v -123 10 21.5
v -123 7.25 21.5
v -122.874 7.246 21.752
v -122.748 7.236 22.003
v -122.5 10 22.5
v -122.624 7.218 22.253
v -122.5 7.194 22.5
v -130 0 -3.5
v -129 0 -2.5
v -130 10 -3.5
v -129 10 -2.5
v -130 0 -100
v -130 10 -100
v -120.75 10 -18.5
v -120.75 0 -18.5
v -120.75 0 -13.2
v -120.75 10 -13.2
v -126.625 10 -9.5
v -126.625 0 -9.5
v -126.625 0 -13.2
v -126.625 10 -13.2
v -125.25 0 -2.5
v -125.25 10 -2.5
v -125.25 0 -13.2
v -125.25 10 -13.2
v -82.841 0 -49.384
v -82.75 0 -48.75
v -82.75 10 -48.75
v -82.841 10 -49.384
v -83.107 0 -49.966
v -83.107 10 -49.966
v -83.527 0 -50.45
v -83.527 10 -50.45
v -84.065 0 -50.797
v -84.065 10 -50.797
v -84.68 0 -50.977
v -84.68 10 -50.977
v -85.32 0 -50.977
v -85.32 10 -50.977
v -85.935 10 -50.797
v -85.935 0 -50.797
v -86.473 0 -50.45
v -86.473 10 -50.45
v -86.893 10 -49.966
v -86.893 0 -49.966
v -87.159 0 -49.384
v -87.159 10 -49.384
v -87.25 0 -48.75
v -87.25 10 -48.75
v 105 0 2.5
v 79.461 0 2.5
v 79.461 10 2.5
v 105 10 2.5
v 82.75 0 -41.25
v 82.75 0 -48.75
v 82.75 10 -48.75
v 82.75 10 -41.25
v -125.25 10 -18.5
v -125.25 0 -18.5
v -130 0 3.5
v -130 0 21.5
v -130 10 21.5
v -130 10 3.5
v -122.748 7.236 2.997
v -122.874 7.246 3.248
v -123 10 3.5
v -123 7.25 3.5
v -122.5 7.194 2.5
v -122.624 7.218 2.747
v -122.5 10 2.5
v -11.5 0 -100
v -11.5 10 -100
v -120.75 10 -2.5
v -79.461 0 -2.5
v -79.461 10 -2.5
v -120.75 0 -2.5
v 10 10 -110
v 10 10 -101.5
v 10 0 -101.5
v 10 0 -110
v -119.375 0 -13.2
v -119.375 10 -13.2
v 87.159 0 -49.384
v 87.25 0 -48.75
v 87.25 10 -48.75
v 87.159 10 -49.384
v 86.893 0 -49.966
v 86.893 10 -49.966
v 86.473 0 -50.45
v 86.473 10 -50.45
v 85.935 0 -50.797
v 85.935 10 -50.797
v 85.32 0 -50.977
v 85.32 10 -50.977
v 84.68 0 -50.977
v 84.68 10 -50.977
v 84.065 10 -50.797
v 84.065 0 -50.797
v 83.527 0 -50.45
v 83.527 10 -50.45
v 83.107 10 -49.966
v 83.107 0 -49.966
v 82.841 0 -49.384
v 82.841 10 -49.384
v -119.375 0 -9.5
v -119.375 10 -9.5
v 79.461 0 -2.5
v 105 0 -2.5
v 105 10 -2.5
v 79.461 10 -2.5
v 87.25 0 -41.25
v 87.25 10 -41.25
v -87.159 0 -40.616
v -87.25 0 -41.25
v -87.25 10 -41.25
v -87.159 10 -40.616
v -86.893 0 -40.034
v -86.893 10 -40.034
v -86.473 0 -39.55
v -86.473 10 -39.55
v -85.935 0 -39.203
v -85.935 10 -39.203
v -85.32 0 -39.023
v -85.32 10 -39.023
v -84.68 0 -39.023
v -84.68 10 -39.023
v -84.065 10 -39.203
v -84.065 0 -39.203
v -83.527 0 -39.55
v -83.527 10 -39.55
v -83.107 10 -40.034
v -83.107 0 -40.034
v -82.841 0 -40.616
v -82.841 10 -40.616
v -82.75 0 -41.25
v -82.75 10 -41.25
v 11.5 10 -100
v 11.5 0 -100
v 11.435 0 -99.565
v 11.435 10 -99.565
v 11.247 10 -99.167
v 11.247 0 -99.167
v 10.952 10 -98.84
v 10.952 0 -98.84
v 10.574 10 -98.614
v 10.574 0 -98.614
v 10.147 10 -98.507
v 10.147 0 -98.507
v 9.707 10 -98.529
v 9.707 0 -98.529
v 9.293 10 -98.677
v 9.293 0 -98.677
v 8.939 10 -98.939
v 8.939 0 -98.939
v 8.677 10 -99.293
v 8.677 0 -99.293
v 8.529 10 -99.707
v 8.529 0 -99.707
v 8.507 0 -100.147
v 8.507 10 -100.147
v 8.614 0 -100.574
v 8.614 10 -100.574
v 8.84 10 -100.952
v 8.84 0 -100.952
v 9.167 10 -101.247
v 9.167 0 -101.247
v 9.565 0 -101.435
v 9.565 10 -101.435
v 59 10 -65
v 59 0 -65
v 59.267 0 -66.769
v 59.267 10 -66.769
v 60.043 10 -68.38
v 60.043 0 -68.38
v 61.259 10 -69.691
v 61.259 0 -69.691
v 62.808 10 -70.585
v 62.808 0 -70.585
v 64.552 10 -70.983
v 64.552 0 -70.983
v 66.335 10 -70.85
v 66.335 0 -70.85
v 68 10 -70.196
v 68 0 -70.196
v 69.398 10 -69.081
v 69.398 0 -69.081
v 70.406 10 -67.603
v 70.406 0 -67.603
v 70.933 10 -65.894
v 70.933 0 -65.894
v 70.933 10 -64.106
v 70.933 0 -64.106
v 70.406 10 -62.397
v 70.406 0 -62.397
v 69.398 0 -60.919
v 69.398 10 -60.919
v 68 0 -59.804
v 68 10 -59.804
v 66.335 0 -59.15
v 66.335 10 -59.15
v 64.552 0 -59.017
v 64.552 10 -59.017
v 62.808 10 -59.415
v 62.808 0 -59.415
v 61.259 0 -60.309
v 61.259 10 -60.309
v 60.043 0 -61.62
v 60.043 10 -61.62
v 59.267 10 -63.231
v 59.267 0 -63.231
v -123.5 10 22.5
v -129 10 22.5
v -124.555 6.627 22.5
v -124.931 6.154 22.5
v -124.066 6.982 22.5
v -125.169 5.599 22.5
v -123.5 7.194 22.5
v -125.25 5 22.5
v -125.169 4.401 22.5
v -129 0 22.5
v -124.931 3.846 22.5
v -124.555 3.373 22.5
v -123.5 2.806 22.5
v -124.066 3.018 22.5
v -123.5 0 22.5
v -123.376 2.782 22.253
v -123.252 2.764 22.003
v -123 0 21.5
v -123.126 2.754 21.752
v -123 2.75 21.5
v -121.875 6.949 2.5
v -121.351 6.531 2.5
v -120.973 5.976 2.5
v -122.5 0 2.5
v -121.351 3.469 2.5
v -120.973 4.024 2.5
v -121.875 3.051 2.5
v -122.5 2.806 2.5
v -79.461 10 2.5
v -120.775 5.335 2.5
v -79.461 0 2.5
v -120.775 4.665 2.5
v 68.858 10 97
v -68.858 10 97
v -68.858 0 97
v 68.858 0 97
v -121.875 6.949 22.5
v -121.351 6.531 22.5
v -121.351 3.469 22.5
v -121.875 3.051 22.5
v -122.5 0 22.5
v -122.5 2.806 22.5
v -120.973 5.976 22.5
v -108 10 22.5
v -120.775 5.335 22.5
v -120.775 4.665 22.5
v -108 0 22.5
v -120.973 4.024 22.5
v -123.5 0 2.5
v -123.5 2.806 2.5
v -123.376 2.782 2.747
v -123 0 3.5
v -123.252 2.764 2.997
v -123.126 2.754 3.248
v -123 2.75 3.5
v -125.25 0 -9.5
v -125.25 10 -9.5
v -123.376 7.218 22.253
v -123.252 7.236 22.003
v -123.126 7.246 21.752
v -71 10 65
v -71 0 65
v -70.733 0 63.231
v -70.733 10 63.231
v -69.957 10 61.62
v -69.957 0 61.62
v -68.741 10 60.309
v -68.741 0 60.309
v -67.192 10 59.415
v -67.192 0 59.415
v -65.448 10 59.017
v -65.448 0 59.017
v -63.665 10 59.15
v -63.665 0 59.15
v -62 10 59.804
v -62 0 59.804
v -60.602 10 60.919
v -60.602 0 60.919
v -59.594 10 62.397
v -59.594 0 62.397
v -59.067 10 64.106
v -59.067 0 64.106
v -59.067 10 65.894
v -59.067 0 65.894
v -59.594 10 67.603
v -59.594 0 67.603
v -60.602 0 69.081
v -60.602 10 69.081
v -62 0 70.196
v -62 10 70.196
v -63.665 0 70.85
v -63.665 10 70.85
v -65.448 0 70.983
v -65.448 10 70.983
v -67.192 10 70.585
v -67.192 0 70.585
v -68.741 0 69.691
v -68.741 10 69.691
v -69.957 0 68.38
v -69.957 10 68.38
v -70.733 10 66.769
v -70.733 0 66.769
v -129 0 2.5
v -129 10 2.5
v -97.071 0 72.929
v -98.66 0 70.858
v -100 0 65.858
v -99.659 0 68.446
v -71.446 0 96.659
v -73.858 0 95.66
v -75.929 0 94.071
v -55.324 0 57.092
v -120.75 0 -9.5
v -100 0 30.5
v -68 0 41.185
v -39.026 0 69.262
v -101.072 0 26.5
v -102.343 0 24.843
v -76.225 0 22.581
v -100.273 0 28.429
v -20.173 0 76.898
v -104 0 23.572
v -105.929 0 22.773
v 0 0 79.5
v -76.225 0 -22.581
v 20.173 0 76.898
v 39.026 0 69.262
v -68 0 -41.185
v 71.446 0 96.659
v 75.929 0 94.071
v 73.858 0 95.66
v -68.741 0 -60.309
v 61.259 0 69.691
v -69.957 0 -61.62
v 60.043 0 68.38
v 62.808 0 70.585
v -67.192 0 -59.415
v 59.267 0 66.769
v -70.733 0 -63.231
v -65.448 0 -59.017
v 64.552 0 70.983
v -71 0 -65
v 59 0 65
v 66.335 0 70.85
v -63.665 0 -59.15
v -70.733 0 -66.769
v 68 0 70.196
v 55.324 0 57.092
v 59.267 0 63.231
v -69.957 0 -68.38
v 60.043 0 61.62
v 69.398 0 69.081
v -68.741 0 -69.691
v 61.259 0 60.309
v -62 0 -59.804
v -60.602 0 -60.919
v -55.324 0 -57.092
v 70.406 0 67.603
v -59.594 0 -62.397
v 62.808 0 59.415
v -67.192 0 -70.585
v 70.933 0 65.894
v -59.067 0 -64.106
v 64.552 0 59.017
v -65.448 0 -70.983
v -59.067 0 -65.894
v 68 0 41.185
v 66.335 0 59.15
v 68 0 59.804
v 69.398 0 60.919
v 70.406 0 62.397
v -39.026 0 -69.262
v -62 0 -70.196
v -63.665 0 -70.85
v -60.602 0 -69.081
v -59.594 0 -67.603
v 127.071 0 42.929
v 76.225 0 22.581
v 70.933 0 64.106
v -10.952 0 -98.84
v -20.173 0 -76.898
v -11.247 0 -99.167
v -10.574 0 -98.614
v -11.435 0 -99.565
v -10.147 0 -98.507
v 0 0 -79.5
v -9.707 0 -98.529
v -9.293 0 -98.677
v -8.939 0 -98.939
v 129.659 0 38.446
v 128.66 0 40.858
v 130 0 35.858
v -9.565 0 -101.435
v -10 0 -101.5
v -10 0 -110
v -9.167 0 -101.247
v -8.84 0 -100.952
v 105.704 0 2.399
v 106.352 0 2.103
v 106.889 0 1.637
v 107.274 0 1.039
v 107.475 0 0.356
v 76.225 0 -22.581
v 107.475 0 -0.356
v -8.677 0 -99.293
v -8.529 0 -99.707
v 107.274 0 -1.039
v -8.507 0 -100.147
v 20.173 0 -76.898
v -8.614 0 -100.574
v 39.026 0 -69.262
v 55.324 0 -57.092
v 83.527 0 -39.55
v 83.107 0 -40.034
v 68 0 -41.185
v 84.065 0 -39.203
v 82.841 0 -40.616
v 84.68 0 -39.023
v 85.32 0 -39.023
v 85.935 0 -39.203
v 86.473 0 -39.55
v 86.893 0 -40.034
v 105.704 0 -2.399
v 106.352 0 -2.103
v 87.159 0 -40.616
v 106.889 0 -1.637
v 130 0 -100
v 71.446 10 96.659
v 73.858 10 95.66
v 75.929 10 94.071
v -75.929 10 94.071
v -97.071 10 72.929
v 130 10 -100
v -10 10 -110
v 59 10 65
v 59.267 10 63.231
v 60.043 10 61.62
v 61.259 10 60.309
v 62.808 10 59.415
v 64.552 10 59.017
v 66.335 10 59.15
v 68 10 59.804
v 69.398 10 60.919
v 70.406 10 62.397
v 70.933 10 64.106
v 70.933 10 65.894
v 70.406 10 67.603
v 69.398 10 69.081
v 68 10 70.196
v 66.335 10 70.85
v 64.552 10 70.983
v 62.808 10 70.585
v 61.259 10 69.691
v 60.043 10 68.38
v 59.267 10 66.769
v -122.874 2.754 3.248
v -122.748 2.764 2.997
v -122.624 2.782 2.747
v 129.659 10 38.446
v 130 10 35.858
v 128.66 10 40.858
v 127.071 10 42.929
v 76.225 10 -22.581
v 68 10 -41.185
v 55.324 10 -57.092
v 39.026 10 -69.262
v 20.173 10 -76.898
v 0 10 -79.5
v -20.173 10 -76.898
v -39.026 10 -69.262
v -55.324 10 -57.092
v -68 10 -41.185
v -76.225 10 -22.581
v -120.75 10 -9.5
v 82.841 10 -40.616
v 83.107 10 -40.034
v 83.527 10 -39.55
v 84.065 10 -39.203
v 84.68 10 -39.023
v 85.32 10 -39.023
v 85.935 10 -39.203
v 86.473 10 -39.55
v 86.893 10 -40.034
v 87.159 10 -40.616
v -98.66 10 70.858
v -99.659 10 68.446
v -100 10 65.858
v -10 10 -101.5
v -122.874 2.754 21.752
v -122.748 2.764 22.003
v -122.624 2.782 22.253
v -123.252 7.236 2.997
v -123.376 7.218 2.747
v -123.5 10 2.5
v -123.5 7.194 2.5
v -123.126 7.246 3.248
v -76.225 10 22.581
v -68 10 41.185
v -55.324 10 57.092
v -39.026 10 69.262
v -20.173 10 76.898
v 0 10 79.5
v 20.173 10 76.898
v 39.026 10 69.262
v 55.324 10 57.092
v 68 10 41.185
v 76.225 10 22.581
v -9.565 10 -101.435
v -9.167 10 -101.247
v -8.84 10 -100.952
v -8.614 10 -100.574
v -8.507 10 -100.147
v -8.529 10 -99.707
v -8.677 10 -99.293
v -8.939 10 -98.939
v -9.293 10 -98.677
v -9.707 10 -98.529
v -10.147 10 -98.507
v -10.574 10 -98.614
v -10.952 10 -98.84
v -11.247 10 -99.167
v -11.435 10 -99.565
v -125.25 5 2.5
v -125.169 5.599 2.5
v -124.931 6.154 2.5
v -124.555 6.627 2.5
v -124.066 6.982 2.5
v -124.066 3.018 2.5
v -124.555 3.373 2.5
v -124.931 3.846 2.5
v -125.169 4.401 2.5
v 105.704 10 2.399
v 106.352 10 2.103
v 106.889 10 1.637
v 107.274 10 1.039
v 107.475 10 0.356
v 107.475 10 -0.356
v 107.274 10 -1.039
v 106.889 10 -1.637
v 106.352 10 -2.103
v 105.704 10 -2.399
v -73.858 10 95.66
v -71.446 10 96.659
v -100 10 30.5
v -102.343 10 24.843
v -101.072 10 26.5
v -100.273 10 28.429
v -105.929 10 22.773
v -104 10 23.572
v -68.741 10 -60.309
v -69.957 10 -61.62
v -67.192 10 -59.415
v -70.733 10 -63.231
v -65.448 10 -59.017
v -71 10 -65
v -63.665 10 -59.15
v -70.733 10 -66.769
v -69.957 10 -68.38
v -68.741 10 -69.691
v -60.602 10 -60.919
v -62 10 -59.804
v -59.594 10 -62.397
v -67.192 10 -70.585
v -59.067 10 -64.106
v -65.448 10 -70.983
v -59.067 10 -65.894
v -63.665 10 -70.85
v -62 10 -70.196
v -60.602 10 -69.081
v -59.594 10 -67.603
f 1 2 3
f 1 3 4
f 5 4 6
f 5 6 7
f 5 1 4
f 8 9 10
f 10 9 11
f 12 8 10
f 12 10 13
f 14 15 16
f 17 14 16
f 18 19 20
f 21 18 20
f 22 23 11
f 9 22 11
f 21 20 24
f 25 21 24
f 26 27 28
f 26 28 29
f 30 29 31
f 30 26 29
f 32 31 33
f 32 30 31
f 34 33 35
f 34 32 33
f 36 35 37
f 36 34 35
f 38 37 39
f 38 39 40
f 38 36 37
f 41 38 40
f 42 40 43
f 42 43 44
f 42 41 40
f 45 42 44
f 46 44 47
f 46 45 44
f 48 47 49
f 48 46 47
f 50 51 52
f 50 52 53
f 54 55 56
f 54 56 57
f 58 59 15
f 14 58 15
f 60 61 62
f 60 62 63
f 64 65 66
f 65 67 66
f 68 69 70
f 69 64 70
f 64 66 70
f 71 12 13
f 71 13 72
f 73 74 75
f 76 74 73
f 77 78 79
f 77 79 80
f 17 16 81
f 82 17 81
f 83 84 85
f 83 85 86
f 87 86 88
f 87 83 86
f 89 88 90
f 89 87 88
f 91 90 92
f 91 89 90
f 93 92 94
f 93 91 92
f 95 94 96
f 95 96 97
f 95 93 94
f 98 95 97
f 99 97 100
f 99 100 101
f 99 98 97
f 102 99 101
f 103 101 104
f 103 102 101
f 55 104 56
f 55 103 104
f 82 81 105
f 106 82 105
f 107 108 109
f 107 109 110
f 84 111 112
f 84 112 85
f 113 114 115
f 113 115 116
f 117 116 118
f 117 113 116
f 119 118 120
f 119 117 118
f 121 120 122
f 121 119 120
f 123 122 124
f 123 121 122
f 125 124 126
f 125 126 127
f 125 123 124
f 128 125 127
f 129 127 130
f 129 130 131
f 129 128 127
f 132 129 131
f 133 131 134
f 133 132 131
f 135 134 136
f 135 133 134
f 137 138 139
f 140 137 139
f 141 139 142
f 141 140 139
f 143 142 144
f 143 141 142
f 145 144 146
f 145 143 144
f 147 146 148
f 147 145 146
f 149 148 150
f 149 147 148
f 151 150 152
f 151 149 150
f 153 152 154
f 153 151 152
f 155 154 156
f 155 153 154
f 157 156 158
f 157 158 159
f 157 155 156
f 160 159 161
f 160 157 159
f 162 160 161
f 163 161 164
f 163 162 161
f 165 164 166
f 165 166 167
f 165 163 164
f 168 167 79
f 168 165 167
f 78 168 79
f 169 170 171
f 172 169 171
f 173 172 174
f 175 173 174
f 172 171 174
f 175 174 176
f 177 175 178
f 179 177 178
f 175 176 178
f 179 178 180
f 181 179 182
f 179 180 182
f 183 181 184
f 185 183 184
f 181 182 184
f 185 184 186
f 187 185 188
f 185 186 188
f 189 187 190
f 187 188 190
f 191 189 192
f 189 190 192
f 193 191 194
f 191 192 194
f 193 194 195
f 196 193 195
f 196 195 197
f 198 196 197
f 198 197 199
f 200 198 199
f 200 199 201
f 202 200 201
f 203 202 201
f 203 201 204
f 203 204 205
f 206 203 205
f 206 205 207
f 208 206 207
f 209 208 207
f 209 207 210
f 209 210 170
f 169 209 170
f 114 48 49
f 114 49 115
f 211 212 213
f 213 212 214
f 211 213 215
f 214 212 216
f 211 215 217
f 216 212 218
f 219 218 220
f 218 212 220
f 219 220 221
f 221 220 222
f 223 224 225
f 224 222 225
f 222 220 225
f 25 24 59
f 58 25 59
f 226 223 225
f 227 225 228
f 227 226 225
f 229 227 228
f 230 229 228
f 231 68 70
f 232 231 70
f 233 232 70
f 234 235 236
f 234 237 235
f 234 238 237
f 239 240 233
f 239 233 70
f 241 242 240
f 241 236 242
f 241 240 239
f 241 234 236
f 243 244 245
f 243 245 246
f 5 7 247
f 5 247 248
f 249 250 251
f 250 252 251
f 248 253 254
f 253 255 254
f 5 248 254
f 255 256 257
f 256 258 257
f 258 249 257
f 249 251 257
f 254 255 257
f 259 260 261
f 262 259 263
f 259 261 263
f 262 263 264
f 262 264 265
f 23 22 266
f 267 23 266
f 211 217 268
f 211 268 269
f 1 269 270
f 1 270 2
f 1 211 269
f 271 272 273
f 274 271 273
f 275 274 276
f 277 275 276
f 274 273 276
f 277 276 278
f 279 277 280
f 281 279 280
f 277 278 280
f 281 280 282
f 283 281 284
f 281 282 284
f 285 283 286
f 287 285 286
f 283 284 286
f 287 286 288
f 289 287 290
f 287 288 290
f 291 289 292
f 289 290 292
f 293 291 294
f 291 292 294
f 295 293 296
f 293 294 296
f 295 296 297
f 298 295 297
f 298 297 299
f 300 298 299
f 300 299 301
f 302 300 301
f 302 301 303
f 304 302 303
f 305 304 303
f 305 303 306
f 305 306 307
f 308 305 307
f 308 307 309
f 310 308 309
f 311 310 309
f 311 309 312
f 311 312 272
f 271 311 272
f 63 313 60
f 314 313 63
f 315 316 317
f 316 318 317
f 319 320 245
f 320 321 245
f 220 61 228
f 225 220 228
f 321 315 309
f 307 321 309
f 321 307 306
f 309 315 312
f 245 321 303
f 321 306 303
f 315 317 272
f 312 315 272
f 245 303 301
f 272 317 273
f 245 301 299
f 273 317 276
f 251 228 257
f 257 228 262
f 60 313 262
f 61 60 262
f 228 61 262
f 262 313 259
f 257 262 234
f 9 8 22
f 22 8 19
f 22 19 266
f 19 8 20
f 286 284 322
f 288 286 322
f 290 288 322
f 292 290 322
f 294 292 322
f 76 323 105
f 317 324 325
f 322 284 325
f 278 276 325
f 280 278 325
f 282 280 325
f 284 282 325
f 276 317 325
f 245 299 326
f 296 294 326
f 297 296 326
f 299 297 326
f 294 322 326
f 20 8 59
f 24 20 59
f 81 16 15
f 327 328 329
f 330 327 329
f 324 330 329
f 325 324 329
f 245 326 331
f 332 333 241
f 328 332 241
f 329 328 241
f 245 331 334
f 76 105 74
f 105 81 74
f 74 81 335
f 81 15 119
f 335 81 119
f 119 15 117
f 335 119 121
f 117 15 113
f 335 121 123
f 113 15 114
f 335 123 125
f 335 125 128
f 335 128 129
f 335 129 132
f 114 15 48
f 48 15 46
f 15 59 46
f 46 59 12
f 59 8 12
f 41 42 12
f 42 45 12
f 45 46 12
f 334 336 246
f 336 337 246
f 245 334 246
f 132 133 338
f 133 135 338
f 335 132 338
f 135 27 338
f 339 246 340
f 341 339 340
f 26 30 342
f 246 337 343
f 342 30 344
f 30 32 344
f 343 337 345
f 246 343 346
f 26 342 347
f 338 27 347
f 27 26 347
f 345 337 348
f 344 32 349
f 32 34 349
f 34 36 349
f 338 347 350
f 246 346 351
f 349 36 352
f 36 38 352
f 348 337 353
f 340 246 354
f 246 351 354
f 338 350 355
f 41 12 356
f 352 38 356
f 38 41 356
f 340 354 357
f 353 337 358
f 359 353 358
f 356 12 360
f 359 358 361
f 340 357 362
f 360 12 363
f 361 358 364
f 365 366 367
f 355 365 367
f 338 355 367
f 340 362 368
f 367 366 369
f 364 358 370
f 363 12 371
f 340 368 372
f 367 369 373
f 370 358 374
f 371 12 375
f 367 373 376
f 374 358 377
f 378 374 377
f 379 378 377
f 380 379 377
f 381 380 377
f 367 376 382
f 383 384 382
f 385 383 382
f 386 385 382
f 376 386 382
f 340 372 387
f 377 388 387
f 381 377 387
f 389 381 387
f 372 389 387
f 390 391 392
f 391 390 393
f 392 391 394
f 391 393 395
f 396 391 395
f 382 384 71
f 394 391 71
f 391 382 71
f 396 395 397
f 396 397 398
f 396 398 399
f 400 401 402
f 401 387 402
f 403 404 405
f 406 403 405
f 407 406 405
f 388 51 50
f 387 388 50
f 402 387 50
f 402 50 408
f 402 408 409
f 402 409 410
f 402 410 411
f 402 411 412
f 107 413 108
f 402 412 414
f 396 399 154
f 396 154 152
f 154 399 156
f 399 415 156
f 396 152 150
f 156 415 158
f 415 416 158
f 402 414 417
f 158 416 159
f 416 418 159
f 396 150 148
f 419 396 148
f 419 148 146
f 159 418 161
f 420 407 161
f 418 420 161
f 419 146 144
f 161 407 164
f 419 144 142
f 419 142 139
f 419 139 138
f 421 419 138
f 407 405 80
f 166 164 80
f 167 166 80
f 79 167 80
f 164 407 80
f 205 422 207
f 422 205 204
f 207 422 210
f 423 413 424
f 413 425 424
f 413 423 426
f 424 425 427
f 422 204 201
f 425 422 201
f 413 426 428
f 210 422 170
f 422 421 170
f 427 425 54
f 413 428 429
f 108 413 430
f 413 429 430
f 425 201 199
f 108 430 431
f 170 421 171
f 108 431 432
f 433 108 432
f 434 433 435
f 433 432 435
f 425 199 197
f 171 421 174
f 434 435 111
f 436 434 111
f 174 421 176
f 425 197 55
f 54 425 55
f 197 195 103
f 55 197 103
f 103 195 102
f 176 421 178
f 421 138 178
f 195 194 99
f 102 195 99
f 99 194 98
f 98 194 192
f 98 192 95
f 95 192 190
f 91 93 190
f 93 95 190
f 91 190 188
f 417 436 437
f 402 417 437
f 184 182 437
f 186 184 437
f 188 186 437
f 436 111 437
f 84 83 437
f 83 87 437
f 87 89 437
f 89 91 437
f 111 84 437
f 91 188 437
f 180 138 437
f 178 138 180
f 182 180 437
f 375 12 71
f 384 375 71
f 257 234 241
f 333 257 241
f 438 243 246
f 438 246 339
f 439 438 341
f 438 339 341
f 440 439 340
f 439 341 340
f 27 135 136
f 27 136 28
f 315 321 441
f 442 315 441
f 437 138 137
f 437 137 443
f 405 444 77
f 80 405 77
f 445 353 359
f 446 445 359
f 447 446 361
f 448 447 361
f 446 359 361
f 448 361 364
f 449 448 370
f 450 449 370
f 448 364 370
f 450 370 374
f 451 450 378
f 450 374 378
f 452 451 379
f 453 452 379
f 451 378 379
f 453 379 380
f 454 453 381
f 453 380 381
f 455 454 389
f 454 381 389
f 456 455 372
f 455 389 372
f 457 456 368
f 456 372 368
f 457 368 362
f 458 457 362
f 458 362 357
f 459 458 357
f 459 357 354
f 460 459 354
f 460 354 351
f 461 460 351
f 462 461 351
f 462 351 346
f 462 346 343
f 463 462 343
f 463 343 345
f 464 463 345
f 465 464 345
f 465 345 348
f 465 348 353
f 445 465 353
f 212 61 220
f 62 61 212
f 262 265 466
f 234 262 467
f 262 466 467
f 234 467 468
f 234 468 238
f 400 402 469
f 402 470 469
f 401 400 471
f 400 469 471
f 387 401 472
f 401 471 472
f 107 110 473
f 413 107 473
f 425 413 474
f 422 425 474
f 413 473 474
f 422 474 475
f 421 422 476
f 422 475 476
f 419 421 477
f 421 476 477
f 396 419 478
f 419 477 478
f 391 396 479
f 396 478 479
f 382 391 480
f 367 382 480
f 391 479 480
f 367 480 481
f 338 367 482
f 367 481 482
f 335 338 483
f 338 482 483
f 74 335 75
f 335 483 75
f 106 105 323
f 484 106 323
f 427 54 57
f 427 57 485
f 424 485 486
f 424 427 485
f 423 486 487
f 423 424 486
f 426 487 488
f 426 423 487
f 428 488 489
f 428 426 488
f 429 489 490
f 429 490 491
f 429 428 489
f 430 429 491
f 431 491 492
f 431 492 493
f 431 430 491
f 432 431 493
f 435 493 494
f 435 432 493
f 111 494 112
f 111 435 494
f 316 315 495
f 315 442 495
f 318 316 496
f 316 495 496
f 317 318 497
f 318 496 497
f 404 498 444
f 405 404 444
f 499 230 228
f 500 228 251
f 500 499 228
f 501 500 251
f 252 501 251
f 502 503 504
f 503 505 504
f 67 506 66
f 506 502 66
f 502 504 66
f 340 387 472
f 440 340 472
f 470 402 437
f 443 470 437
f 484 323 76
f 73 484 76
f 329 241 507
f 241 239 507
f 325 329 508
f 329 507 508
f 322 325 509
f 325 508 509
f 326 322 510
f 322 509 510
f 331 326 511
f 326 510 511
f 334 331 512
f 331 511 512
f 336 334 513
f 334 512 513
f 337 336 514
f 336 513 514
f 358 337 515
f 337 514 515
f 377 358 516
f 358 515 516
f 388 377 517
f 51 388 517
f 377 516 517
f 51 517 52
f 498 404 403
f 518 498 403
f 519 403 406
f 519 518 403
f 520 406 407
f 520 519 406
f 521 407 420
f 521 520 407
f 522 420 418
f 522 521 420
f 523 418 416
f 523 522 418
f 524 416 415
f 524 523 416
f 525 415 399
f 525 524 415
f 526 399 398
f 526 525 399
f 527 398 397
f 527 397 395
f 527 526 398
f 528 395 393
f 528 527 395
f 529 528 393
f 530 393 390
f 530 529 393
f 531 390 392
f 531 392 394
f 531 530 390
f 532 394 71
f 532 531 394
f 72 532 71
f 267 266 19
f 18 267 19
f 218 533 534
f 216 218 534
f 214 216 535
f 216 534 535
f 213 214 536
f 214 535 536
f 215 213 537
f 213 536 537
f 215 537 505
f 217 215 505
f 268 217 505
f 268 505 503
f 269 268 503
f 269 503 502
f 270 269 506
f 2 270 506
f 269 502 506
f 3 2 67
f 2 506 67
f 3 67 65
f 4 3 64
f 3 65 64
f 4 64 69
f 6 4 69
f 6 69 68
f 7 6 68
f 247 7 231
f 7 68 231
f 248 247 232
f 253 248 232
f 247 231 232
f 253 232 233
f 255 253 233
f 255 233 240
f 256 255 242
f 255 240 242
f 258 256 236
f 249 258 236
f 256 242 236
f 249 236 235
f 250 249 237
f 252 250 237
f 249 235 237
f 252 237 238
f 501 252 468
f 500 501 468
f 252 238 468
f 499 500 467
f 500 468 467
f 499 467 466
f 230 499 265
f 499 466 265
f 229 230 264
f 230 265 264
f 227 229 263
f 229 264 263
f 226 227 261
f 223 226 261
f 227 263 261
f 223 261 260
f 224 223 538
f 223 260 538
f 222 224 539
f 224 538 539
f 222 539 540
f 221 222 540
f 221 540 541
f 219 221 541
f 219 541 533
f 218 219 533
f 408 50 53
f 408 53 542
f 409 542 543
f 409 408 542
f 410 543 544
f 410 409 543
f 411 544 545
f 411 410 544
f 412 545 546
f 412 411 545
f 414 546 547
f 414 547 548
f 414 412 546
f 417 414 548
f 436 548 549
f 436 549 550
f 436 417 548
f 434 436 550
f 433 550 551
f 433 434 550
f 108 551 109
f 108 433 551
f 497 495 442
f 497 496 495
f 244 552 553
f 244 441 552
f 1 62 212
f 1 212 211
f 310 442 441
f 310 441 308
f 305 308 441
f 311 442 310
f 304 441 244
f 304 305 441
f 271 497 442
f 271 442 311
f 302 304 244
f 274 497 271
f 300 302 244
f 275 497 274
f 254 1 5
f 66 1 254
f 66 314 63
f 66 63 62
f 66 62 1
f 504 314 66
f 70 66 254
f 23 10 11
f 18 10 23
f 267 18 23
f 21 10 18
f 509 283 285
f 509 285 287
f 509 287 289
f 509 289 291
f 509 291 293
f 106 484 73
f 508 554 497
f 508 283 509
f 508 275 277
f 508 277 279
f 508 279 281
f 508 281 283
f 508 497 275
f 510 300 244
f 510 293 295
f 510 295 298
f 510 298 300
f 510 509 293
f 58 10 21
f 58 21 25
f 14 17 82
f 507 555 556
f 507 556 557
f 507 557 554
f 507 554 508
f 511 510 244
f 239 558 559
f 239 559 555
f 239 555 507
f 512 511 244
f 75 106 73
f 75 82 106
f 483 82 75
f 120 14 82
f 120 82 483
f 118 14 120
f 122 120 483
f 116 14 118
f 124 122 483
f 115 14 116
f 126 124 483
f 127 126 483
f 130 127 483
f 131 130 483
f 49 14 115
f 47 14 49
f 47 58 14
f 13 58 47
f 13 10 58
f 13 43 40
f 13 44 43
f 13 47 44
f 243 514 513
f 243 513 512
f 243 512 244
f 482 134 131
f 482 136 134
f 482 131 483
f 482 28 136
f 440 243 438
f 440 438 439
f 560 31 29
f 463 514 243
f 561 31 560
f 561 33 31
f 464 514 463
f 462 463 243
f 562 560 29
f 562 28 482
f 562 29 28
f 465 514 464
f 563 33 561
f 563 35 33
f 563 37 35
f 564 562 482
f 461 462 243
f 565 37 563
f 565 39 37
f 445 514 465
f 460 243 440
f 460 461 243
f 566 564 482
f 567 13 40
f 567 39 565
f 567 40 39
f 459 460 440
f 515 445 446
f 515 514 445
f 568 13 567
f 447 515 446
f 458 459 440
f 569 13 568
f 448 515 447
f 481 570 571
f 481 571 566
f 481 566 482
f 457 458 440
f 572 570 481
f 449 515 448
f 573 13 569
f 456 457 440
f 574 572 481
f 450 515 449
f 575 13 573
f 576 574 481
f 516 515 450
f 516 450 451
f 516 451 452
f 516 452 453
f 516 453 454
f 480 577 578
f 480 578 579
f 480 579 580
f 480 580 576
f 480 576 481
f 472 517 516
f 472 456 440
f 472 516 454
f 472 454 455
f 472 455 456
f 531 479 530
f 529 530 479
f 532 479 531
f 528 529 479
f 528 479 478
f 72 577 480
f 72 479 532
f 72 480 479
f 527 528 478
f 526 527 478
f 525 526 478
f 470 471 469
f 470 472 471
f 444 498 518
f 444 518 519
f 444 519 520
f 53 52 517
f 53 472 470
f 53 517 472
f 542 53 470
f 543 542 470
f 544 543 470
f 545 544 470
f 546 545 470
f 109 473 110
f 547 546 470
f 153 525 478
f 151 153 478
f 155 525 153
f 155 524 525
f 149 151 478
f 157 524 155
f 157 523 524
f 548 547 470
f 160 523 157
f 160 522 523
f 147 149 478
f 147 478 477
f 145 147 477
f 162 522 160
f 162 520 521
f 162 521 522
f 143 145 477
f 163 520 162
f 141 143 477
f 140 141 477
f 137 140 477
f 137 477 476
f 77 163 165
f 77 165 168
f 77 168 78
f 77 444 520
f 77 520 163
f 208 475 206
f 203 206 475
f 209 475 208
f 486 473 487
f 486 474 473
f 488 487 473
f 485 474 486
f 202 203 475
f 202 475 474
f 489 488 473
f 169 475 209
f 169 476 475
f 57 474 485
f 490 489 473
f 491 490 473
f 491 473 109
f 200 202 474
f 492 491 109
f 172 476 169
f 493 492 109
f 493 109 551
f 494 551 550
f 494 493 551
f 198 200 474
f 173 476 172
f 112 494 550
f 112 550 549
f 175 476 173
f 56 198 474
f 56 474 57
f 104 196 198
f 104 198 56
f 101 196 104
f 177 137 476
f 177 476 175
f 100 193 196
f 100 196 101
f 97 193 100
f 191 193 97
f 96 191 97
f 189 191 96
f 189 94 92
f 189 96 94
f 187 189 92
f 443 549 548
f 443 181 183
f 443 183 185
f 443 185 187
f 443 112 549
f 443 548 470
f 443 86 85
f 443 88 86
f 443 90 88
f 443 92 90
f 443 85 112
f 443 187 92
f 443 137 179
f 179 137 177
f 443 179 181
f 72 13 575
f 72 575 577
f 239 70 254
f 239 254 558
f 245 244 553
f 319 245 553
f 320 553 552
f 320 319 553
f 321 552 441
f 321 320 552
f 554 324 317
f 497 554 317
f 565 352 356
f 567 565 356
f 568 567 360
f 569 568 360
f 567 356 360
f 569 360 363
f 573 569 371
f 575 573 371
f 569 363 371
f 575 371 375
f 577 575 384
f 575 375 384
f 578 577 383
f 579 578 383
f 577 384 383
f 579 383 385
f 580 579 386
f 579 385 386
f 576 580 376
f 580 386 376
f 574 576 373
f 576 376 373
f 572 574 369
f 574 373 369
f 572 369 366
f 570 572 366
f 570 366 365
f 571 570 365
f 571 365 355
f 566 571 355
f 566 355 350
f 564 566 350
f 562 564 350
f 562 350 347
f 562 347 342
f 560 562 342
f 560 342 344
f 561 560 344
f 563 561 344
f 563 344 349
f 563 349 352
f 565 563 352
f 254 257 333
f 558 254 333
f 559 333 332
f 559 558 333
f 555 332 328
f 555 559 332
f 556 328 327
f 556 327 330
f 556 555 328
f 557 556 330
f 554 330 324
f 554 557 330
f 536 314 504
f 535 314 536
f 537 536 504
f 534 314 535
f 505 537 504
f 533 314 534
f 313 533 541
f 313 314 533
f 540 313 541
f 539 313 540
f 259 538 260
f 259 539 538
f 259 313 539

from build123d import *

# Parameters (mm, degrees)
SKETCH1_W                  = 260
SKETCH1_H                  = 200
EXTRUDE1_DEPTH             = 10
SKETCH2_R                  = 79.5
EXTRUDE2_DEPTH             = 10
M4_CLEARANCE_HOLE2_DEPTH   = 10
EXTRUDE3_DEPTH             = 10
SKETCH6_W                  = 30
SKETCH6_H                  = 77.5
EXTRUDE4_DEPTH             = 10
FILLET1_R                  = 8
M4_CLEARANCE_HOLE3_D       = 4.5
M4_CLEARANCE_HOLE3_DEPTH   = 20
EXTRUDE5_DEPTH             = 10
F_12_0_12_DIAMETER_HOLE1_D = 12
CHAMFER1_SIZE              = 30
CHAMFER2_SIZE              = 1
CHAMFER3_SIZE              = 60
SKETCH16_W                 = 146
SKETCH16_H                 = 3
EXTRUDE6_DEPTH             = 10
FILLET4_R                  = 10
EXTRUDE7_DEPTH             = 10
SKETCH18_W                 = 20
SKETCH18_H                 = 10
EXTRUDE8_DEPTH             = 10
EXTRUDE9_DEPTH             = 10


# Read off the part's stored shape, not the designer's step: M4 Clearance Hole2
with BuildPart() as part:
    # Sketch1 → Extrude1 (new body)
    with BuildSketch(Plane(origin=(0, 0, 0), x_dir=(1, 0, 0), z_dir=(0, 1, 0))):
        Rectangle(SKETCH1_W, SKETCH1_H)
    extrude(amount=EXTRUDE1_DEPTH)

    # Sketch2 → Extrude2 (cut)
    with BuildSketch(Plane(origin=(0, 10, 0), x_dir=(1, 0, 0), z_dir=(0, 1, 0))):
        with Locations(Location((0, 0, 0), (0, 0, 270))):
            Circle(SKETCH2_R)
    extrude(amount=-EXTRUDE2_DEPTH, mode=Mode.SUBTRACT)

    # M4 Clearance Hole2 outline → M4 Clearance Hole2 (cut)
    with BuildSketch(Plane(origin=(0, 0, 0), x_dir=(1, 0, 0), z_dir=(0, 1, 0))):
        with BuildLine():
            ThreePointArc((-82.75, 48.75), (-85, 51), (-87.25, 48.75))
            Line((-87.25, 48.75), (-87.25, 41.25))
            ThreePointArc((-87.25, 41.25), (-85, 39), (-82.75, 41.25))
            Line((-82.75, 41.25), (-82.75, 48.75))
        make_face()
        with BuildLine():
            ThreePointArc((87.25, 48.75), (85, 51), (82.75, 48.75))
            Line((82.75, 48.75), (82.75, 41.25))
            ThreePointArc((82.75, 41.25), (85, 39), (87.25, 41.25))
            Line((87.25, 41.25), (87.25, 48.75))
        make_face()
    extrude(amount=M4_CLEARANCE_HOLE2_DEPTH, mode=Mode.SUBTRACT)

    # Sketch5 → Extrude3 (cut)
    with BuildSketch(Plane.XZ):
        with BuildLine():
            Line((-130, 2.5), (105, 2.5))
            ThreePointArc((105, 2.5), (107.5, 0), (105, -2.5))
            Line((105, -2.5), (-130, -2.5))
            Line((-130, -2.5), (-130, 2.5))
        make_face()
    extrude(amount=-EXTRUDE3_DEPTH, mode=Mode.SUBTRACT)

    # Sketch6 → Extrude4 (cut)
    with BuildSketch(Plane.XZ):
        with Locations((-115, 61.25)):
            Rectangle(SKETCH6_W, SKETCH6_H)
    extrude(amount=-EXTRUDE4_DEPTH, mode=Mode.SUBTRACT)

    # Fillet1
    fillet1_edges = [part.edges().sort_by_distance(p)[0] for p in [
        (-100, 5, 22.5),
    ]]
    fillet(fillet1_edges, radius=FILLET1_R)

    # M4 Clearance Hole3
    with Locations(Plane.XY.offset(22.5)):
        with Locations((-123, 5)):
            Hole(M4_CLEARANCE_HOLE3_D / 2, depth=M4_CLEARANCE_HOLE3_DEPTH)

    # Sketch11 → Extrude5 (cut)
    with BuildSketch(Plane.XZ):
        Polygon((-125.25, -2.5), (-125.25, -9.5), (-126.625, -9.5), (-126.625, -13.2), (-125.25, -13.2), (-125.25, -18.5), (-120.75, -18.5), (-120.75, -13.2), (-119.375, -13.2), (-119.375, -9.5), (-120.75, -9.5), (-120.75, -2.5), align=None)
    extrude(amount=-EXTRUDE5_DEPTH, mode=Mode.SUBTRACT)

    # Ø12.0 (12) Diameter Hole1 (through all)
    with Locations(Plane(origin=(-130, 20, 100), x_dir=(1, 0, 0), z_dir=(0, 1, 0))):
        with Locations((65, 165), (195, 165), (195, 35), (65, 35)):
            Hole(F_12_0_12_DIAMETER_HOLE1_D / 2)

    # Chamfer1
    chamfer1_edges = [part.edges().sort_by_distance(p)[0] for p in [
        (-100, 5, 100),
    ]]
    chamfer(chamfer1_edges, length=CHAMFER1_SIZE)

    # Chamfer2
    chamfer2_edges = [part.edges().sort_by_distance(p)[0] for p in [
        (-130, 5, 2.5),
        (-130, 5, -2.5),
        (-130, 5, 22.5),
    ]]
    chamfer(chamfer2_edges, length=CHAMFER2_SIZE)

    # Chamfer3
    chamfer3_edges = [part.edges().sort_by_distance(p)[0] for p in [
        (130, 5, 100),
    ]]
    chamfer(chamfer3_edges, length=CHAMFER3_SIZE)

    # Sketch16 → Extrude6 (cut)
    with BuildSketch(Plane(origin=(0, 10, 0), x_dir=(1, 0, 0), z_dir=(0, 1, 0))):
        with Locations((0, -98.5)):
            Rectangle(SKETCH16_W, SKETCH16_H)
    extrude(amount=-EXTRUDE6_DEPTH, mode=Mode.SUBTRACT)

    # Fillet4
    fillet4_edges = [part.edges().sort_by_distance(p)[0] for p in [
        (-100, 5, 70),
        (130, 5, 40),
        (-73, 5, 97),
        (73, 5, 97),
    ]]
    fillet(fillet4_edges, radius=FILLET4_R)

    # Sketch17 → Extrude7 (cut)
    with BuildSketch(Plane(origin=(0, 10, 0), x_dir=(1, 0, 0), z_dir=(0, 1, 0))):
        Polygon((-122.5, -2.5), (-123.5, -2.5), (-123, -3.5), align=None)
    extrude7 = extrude(amount=-EXTRUDE7_DEPTH, mode=Mode.SUBTRACT)

    # Mirror1: Extrude7 across plane
    add(extrude7.mirror(Plane(origin=(0, 0, 12.5), x_dir=(1, 0, 0), z_dir=(0, 0, -1))), mode=Mode.SUBTRACT)

    # Sketch18 → Extrude8 (add)
    with BuildSketch(Plane(origin=(0, 10, 0), x_dir=(1, 0, 0), z_dir=(0, 1, 0))):
        with Locations((0, 105)):
            Rectangle(SKETCH18_W, SKETCH18_H)
    extrude(amount=-EXTRUDE8_DEPTH)

    # Sketch19 → Extrude9 (cut)
    with BuildSketch(Plane(origin=(0, 10, 0), x_dir=(1, 0, 0), z_dir=(0, 1, 0))):
        with BuildLine():
            Line((-11.5, 100), (-10, 100))
            Line((-10, 100), (-10, 101.5))
            ThreePointArc((-10, 101.5), (-8.939339828, 98.939339828), (-11.5, 100))
        make_face()
        with BuildLine():
            Line((10, 101.5), (10, 100))
            Line((10, 100), (11.5, 100))
            ThreePointArc((11.5, 100), (8.939339828, 98.939339828), (10, 101.5))
        make_face()
    extrude(amount=-EXTRUDE9_DEPTH, mode=Mode.SUBTRACT)


solid = part.part
